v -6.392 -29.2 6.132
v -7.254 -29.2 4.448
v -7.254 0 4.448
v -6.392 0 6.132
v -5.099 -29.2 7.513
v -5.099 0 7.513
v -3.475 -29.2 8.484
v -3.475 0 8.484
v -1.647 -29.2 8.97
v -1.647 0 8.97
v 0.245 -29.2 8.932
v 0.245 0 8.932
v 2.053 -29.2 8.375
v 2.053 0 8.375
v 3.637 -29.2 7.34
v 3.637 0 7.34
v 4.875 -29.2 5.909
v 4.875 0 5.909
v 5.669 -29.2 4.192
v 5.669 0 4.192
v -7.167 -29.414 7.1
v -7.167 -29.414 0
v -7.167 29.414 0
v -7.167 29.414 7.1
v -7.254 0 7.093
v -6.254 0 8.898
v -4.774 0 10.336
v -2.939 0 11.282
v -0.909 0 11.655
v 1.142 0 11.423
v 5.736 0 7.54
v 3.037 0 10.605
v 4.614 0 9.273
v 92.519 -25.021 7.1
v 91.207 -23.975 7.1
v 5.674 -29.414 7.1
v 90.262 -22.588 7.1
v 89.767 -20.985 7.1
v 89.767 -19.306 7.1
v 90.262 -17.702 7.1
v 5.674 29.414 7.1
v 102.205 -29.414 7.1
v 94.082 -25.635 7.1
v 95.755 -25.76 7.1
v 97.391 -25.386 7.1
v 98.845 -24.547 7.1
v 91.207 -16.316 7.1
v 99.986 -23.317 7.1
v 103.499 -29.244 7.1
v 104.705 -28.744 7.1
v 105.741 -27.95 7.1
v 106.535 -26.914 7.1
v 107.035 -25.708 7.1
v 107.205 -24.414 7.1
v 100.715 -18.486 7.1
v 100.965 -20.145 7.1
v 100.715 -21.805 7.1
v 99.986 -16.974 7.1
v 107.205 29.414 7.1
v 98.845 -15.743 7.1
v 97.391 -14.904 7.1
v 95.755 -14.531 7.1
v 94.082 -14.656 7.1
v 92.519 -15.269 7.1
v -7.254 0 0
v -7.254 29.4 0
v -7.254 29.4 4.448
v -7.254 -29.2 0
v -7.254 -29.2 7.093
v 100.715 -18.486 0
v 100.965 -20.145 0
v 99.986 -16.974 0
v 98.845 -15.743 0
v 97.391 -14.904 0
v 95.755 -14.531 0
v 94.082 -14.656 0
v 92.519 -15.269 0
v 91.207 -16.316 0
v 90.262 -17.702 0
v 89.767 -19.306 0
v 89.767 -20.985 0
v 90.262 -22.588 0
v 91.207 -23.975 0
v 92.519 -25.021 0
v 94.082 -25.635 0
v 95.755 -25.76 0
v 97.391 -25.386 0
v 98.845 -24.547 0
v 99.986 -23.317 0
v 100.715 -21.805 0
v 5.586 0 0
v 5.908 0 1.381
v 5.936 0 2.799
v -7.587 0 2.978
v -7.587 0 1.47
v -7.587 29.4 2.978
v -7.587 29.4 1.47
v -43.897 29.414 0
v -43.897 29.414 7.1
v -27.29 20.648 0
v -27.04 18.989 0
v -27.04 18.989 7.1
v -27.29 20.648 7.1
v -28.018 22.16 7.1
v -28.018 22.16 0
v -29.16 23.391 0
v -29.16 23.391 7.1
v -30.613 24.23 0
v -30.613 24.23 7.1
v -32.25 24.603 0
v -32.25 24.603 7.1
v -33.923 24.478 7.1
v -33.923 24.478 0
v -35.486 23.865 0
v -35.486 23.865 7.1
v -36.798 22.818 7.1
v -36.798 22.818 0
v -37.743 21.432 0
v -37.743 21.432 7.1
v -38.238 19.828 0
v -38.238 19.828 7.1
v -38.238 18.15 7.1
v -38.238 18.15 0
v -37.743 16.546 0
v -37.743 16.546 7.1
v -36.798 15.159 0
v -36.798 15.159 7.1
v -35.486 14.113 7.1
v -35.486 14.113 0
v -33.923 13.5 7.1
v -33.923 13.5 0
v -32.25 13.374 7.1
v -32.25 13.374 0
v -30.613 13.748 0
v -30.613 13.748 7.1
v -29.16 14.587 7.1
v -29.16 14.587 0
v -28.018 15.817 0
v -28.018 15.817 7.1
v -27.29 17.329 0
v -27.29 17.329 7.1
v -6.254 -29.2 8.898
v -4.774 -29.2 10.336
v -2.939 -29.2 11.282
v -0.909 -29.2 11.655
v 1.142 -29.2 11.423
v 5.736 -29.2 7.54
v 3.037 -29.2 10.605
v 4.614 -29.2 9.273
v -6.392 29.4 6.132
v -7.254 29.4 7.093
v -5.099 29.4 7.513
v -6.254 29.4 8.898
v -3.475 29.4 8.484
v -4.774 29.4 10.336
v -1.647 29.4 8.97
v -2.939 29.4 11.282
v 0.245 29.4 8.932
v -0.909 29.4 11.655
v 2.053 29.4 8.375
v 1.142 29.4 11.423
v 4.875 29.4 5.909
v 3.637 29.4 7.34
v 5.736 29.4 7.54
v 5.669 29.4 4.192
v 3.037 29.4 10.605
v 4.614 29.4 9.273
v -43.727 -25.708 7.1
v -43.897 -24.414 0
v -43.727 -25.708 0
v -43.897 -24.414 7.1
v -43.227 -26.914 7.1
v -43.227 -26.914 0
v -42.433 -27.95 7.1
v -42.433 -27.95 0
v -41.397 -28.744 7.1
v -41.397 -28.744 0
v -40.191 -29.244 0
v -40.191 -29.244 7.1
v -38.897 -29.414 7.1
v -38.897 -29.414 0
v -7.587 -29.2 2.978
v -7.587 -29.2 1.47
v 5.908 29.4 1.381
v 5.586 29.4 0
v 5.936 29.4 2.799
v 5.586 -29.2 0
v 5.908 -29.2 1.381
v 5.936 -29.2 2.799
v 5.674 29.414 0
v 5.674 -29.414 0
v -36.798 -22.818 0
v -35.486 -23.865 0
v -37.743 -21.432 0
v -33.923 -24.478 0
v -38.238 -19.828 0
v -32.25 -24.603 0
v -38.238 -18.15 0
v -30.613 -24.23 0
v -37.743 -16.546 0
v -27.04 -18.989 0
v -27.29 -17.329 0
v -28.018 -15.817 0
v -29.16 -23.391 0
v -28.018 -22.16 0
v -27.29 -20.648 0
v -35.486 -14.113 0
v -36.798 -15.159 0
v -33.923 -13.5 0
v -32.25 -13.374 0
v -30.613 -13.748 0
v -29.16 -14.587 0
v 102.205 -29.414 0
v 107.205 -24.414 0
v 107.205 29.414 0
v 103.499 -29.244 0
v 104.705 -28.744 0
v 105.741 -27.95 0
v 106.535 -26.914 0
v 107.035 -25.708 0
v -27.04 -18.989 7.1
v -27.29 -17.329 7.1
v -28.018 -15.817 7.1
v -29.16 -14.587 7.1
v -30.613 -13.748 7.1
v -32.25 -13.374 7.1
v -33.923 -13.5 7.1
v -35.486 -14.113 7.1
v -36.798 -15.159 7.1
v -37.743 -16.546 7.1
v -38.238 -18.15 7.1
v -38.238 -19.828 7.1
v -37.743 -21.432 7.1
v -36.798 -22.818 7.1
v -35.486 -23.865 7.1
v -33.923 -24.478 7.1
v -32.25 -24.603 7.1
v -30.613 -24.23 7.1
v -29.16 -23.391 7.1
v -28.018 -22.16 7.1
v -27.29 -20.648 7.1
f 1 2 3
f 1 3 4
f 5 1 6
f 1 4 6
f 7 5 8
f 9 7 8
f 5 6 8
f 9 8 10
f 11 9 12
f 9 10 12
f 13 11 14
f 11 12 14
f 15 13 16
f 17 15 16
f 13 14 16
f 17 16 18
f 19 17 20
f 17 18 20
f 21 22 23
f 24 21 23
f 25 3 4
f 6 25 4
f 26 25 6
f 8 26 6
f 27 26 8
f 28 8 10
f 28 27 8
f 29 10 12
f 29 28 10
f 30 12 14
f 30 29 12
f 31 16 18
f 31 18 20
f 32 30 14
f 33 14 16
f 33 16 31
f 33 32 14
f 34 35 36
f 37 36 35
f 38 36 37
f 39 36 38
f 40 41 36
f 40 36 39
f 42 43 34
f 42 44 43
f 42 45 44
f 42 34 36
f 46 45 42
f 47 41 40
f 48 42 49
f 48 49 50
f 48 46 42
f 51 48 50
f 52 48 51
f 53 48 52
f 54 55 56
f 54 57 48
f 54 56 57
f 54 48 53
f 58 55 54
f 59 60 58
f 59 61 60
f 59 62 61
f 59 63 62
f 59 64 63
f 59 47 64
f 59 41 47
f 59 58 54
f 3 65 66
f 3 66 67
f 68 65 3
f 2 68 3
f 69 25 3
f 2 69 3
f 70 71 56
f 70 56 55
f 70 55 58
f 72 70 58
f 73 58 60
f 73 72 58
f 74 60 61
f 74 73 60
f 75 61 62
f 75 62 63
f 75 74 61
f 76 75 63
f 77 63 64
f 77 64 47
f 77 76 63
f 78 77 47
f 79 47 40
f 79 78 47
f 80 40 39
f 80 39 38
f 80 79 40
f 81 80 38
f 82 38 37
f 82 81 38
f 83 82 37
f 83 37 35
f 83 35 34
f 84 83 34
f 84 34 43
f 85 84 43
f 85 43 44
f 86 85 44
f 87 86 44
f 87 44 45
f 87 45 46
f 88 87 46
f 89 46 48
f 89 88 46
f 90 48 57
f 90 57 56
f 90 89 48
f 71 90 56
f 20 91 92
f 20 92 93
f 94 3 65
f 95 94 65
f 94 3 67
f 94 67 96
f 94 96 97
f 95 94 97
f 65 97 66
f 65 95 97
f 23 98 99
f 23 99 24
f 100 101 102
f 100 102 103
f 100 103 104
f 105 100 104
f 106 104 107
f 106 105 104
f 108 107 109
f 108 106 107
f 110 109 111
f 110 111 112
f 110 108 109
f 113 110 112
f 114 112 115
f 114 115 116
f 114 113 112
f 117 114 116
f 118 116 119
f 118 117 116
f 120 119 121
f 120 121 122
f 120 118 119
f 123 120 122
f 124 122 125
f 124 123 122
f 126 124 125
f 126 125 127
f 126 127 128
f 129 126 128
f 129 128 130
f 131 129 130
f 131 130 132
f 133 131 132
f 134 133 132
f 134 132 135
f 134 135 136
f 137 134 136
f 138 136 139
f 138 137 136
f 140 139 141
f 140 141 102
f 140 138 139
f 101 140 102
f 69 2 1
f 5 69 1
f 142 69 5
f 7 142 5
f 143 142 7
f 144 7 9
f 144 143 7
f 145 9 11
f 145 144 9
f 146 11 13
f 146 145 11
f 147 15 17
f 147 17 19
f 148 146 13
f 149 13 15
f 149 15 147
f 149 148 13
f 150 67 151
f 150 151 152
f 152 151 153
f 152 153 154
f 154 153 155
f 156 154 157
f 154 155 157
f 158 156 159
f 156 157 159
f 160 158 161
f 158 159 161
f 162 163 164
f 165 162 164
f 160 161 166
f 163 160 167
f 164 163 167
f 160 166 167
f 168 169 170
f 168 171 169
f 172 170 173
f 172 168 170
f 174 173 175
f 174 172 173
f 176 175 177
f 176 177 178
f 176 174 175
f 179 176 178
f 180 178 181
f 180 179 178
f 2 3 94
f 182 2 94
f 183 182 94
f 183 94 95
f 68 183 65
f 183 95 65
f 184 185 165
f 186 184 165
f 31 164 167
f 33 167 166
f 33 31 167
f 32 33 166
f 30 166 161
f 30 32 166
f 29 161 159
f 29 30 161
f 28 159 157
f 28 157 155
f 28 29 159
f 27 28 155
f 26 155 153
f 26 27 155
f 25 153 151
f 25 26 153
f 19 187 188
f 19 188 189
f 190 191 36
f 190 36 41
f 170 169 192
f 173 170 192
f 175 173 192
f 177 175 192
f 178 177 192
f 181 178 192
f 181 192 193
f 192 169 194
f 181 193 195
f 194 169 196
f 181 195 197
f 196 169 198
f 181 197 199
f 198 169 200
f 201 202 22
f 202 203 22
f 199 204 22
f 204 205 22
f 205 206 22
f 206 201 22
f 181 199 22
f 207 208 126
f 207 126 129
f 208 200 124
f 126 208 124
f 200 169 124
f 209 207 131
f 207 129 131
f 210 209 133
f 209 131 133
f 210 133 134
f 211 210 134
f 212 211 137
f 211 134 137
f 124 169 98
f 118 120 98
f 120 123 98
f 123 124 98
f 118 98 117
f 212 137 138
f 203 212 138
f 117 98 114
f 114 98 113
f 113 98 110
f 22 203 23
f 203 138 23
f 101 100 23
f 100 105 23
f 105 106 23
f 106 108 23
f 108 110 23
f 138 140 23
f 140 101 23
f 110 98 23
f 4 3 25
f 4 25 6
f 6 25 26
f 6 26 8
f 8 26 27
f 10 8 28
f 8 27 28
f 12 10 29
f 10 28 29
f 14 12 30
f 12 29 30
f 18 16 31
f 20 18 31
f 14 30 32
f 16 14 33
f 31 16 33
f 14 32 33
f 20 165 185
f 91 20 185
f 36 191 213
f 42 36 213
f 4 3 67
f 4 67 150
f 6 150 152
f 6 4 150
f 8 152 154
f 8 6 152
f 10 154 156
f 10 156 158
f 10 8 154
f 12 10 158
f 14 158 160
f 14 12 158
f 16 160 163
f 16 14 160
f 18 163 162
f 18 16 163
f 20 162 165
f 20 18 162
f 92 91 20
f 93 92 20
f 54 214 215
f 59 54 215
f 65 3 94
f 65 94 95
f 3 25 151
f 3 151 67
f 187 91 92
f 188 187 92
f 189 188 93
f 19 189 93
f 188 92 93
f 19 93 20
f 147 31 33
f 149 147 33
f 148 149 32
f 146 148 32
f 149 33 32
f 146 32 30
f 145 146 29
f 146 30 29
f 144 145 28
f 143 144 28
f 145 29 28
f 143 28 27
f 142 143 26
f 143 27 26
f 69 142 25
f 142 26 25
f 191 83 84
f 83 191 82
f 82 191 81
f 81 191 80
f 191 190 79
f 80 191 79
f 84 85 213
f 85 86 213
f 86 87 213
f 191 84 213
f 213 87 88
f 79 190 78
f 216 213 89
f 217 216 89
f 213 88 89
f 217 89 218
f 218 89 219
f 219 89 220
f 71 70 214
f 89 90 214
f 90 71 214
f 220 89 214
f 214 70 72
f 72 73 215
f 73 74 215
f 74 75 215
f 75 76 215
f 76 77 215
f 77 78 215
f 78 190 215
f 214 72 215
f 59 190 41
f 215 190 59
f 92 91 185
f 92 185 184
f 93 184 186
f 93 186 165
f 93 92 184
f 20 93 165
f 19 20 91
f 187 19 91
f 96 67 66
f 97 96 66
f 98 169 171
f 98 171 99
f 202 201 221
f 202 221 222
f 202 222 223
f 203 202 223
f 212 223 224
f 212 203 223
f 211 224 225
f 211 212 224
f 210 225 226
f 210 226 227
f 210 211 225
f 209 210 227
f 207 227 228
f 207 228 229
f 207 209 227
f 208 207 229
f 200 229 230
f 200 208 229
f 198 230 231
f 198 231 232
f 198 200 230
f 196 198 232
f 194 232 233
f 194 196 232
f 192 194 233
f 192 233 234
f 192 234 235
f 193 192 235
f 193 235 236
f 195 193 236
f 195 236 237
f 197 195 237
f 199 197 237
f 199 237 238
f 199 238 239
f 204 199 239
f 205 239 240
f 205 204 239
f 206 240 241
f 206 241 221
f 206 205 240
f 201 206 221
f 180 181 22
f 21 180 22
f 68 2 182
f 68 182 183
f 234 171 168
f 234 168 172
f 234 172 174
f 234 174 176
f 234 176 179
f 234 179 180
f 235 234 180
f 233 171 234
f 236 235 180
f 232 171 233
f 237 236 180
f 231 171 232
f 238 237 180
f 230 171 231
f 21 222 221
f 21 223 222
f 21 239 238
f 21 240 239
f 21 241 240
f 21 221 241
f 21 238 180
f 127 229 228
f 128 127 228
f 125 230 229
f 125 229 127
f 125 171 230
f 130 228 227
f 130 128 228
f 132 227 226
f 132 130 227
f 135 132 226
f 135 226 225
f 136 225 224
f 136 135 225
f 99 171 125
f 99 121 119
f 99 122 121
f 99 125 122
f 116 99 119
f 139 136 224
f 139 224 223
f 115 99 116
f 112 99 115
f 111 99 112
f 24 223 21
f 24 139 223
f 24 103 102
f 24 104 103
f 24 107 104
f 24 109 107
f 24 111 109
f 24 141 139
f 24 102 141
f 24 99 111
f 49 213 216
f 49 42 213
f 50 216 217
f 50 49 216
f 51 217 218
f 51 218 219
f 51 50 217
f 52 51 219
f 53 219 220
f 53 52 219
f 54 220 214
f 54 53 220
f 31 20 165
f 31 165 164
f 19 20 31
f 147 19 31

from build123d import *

# Parameters (mm, degrees)
F0_W     = 36.730407
F0_H     = 58.828374
F0_R     = 5.630318
F0_W_2   = 101.531213
F1_DEPTH = 7.1
F3_DEPTH = 29.2
F4_DEPTH = 29.4
F5_R     = 5


with BuildPart() as f1:
    # F0 (on Top) → F1 (new body)
    with BuildSketch(Plane.XY):
        with Locations((-25.532108, -3e-06)):
            Rectangle(F0_W, F0_H)
        with Locations((-32.670446, -18.98868)):
            Circle(F0_R, mode=Mode.SUBTRACT)
        with Locations((-32.670446, 18.98868)):
            Circle(F0_R, mode=Mode.SUBTRACT)
        with Locations((56.439411, -3e-06)):
            Rectangle(F0_W_2, F0_H)
        with Locations((95.334463, -20.145353)):
            Circle(F0_R, mode=Mode.SUBTRACT)
    extrude(amount=F1_DEPTH)

    # F5
    f5_edges = [f1.edges().sort_by_distance(p)[0] for p in [
        (-43.897312, -29.41419, 3.55),
        (107.205018, -29.41419, 3.55),
    ]]
    fillet(f5_edges, radius=F5_R)


with BuildPart() as f3:
    # F2 (on Front) → F3 (new body)
    with BuildSketch(Plane.XZ):
        with BuildLine():
            Line((5.669345, 4.191866), (5.735652, 7.540484))
            ThreePointArc((5.735652, 7.540484), (-0.908968, 11.655184), (-7.254369, 7.092553))
            Line((-7.254369, 7.092553), (-7.254369, 4.447771))
            ThreePointArc((-7.254369, 4.447771), (-0.699499, 9.017157), (5.669345, 4.191866))
        make_face()
        with BuildLine():
            ThreePointArc((5.586341, 0), (5.959257, 2.08937), (5.669345, 4.191866))
            Line((5.669345, 4.191866), (5.586341, 0))
        make_face()
        with BuildLine():
            Line((-7.254369, 0), (-7.254369, 4.447771))
            ThreePointArc((-7.254369, 4.447771), (-7.628617, 2.223886), (-7.254369, 0))
        make_face()
    extrude(amount=F3_DEPTH)


with BuildPart() as f4:
    # F2 (on Front) → F4 (new body)
    with BuildSketch(Plane.XZ):
        with BuildLine():
            Line((5.669345, 4.191866), (5.735652, 7.540484))
            ThreePointArc((5.735652, 7.540484), (-0.908968, 11.655184), (-7.254369, 7.092553))
            Line((-7.254369, 7.092553), (-7.254369, 4.447771))
            ThreePointArc((-7.254369, 4.447771), (-0.699499, 9.017157), (5.669345, 4.191866))
        make_face()
        with BuildLine():
            ThreePointArc((5.586341, 0), (5.959257, 2.08937), (5.669345, 4.191866))
            Line((5.669345, 4.191866), (5.586341, 0))
        make_face()
        with BuildLine():
            Line((-7.254369, 0), (-7.254369, 4.447771))
            ThreePointArc((-7.254369, 4.447771), (-7.628617, 2.223886), (-7.254369, 0))
        make_face()
    extrude(amount=-F4_DEPTH)


solid = Compound([f1.part, f3.part, f4.part])
